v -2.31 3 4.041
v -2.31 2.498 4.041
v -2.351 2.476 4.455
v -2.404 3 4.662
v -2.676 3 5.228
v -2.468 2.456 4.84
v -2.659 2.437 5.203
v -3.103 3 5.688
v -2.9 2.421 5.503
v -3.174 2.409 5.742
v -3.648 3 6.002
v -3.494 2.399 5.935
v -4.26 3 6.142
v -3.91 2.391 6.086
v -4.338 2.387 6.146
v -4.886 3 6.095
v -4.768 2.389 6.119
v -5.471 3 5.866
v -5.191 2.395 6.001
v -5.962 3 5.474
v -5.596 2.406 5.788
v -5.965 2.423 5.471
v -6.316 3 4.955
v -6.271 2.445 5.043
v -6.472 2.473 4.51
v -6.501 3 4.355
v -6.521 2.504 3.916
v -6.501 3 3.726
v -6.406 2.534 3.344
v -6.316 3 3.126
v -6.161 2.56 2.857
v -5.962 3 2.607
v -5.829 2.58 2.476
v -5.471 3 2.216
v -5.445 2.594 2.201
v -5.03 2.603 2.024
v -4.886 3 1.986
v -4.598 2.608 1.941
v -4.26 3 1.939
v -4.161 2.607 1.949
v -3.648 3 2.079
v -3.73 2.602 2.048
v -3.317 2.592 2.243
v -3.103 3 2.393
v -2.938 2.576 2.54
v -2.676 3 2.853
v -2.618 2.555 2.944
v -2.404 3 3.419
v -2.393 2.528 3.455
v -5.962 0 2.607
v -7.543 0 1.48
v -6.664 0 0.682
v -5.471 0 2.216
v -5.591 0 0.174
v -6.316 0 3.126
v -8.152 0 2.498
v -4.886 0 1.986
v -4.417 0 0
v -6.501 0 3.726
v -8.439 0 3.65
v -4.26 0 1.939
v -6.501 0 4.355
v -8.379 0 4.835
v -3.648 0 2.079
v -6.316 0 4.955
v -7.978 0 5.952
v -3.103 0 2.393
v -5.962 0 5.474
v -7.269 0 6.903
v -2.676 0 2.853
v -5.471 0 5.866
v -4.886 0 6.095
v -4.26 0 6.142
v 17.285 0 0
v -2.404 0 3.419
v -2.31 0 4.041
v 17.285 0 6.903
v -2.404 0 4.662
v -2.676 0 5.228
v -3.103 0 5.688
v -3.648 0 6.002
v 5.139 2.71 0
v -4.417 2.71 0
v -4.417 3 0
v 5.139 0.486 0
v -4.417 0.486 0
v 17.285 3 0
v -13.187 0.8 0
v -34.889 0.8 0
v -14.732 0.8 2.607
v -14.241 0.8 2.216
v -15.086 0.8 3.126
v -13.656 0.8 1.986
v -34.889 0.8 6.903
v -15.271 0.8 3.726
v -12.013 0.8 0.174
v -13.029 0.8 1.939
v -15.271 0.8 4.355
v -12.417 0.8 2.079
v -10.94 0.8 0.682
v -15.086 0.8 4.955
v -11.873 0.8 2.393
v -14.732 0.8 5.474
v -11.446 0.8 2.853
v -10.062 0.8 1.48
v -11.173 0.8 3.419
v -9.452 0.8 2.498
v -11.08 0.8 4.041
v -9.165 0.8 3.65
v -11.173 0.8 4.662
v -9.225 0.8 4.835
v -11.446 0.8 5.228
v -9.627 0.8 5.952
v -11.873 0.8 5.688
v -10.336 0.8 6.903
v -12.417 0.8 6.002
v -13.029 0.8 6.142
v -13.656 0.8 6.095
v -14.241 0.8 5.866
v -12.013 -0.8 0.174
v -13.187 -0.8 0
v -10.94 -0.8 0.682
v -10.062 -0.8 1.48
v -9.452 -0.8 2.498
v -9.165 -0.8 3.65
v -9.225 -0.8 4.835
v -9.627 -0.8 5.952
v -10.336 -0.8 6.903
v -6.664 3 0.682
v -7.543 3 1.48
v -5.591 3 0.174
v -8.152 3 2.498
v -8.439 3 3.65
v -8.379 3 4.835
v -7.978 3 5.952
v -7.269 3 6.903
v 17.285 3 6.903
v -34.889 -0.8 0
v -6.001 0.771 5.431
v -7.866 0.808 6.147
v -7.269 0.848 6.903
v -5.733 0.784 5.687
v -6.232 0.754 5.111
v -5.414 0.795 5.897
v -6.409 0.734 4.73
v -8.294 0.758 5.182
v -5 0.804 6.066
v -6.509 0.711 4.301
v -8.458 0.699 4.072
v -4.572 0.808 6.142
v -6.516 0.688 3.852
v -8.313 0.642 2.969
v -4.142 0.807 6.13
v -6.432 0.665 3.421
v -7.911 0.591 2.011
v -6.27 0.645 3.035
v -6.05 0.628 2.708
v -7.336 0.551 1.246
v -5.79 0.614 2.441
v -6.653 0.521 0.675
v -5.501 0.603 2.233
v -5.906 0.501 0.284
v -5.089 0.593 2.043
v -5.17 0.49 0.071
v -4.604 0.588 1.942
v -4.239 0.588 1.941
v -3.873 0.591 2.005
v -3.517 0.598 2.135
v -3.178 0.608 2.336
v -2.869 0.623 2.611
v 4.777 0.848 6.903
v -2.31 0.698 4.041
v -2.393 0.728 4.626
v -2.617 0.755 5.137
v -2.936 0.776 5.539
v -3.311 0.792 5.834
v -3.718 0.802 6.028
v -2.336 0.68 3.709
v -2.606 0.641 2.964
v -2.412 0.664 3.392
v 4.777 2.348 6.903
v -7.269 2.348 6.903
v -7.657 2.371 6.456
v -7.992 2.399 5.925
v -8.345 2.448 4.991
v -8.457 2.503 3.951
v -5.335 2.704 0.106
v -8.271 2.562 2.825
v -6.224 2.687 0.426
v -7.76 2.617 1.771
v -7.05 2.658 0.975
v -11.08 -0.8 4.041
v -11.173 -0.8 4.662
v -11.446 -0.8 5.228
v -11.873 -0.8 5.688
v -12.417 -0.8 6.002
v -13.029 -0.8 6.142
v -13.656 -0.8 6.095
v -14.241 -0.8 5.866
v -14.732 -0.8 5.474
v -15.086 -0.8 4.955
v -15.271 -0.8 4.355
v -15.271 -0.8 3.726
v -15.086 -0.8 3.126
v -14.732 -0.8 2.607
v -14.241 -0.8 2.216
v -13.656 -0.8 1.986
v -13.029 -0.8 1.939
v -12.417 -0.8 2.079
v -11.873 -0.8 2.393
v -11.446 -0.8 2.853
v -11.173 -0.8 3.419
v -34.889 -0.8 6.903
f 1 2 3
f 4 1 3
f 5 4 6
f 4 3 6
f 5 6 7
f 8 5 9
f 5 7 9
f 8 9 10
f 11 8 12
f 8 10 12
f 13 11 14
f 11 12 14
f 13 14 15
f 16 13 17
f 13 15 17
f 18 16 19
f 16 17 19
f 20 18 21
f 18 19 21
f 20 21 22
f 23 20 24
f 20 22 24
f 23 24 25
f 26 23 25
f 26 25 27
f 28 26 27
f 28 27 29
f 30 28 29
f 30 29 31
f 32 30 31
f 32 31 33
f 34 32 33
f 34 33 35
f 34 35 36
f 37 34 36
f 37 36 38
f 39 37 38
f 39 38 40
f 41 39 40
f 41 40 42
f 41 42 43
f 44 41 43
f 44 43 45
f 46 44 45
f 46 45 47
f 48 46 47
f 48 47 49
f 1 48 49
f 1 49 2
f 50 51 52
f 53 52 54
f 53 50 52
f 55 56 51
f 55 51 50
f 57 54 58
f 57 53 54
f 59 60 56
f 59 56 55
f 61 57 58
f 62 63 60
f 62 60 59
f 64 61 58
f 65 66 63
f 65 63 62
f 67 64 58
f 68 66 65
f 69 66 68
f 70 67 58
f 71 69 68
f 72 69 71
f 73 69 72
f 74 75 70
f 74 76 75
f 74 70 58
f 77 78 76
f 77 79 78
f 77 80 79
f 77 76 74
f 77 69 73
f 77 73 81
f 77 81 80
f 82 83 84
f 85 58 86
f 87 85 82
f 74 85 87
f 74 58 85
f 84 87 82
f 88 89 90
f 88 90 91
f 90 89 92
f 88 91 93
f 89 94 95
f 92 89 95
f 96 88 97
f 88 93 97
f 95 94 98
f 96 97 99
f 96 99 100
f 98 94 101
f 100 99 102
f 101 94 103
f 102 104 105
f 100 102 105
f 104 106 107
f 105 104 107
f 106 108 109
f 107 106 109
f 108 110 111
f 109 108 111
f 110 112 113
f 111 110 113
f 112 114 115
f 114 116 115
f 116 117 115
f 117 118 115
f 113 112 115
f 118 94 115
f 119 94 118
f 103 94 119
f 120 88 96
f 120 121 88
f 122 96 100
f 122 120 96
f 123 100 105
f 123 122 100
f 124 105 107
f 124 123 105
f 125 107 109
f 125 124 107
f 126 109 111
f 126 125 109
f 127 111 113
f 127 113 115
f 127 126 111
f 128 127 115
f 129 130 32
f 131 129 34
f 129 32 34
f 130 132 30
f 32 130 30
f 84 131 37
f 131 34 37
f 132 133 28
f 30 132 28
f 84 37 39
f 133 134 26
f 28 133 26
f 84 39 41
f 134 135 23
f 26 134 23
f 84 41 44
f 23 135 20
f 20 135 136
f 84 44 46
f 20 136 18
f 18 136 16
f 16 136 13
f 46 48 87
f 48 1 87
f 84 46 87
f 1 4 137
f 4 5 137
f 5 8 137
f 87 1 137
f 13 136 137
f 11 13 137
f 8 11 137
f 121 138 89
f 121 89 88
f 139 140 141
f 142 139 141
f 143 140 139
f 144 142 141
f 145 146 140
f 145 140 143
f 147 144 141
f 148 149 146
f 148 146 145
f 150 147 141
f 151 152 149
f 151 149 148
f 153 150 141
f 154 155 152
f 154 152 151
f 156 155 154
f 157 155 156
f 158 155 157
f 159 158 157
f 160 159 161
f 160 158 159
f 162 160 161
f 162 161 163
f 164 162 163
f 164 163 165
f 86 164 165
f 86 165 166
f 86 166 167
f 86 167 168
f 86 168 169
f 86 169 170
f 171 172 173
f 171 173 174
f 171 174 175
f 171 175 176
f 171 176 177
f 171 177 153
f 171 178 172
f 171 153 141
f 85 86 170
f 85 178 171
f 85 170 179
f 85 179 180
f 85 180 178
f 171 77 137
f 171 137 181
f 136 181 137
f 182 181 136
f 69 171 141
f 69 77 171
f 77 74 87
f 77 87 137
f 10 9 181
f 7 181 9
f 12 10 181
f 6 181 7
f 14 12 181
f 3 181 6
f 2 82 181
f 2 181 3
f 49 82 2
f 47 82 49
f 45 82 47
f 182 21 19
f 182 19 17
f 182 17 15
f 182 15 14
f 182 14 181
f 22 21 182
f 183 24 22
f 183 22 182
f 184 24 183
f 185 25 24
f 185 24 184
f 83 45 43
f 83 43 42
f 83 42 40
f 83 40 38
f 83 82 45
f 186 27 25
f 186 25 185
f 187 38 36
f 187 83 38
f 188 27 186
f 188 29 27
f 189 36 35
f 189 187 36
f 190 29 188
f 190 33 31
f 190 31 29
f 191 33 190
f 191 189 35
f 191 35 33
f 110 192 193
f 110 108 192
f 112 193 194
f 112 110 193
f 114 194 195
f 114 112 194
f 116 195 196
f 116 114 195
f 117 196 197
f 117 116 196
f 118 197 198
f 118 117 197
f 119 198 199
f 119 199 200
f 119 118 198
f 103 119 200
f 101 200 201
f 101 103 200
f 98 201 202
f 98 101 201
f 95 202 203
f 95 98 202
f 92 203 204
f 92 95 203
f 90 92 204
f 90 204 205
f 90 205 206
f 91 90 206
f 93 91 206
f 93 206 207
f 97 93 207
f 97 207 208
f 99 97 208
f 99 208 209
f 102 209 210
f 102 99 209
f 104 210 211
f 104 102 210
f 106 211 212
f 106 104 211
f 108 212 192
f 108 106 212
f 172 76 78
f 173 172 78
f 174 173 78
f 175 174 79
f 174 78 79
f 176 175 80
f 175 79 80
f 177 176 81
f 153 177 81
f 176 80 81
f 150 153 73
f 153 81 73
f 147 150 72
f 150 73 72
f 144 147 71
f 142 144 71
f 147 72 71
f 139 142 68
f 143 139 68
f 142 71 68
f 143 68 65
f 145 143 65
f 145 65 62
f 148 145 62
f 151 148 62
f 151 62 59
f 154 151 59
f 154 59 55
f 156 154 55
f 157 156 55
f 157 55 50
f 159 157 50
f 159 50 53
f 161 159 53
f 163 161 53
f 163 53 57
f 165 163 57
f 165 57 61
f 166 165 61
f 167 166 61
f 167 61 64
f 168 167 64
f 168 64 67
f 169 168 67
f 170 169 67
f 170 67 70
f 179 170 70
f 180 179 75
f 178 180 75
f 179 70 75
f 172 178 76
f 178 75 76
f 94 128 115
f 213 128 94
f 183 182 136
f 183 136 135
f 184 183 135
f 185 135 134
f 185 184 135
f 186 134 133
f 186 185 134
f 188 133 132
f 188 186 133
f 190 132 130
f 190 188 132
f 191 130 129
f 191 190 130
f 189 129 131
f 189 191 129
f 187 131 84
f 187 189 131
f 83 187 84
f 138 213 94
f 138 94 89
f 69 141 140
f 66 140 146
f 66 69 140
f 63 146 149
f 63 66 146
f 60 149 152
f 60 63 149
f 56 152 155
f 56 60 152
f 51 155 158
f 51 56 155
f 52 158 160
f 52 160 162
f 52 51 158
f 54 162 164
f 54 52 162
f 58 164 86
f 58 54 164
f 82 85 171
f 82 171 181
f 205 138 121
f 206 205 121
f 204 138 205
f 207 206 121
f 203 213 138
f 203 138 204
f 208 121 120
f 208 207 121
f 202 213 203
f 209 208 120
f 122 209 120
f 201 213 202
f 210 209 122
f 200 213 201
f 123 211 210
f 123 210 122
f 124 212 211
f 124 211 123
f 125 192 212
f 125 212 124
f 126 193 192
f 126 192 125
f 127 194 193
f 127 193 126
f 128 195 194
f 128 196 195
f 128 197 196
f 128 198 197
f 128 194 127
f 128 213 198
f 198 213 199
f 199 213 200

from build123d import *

# Parameters (mm, degrees)
F0_R     = 2.107357614
F1_DEPTH = 3
F2_W     = 14.7599969779
F2_H     = 1.5
F3_DEPTH = 12.5
F3_TAPER = -3
F4_DEPTH = 0.8


with BuildPart() as f1:
    # F0 (on Front) → F1 (new body)
    with BuildSketch(Plane.XZ):
        with BuildLine():
            ThreePointArc((-7.268779725, 6.9034374319), (-8.1519679743, 2.4980690393), (-4.4174073264, 0))
            Line((-4.4174073264, 0), (17.2846987844, 0))
            Line((17.2846987844, 0), (17.2846987844, 6.9034374319))
            Line((17.2846987844, 6.9034374319), (-1.1204044567, 6.9034374319))
            Line((-1.1204044567, 6.9034374319), (-7.268779725, 6.9034374319))
        make_face()
        with Locations((-4.4174073264, 4.0405793115)):
            Circle(F0_R, mode=Mode.SUBTRACT)
    extrude(amount=-F1_DEPTH)

    # F2 (on face) → F3 (cut, symmetric)
    with BuildSketch(Plane.XY.offset(6.9034374319)):
        with Locations((-2.6028734865, 1.5977723524)):
            Rectangle(F2_W, F2_H)
    extrude(amount=F3_DEPTH, both=True, taper=F3_TAPER, mode=Mode.SUBTRACT)


with BuildPart() as f4:
    # F0 (on Front) → F4 (new body, symmetric)
    with BuildSketch(Plane.XZ):
        with BuildLine():
            Line((-10.3355769066, 6.9034374319), (-16.4839521749, 6.9034374319))
            Line((-16.4839521749, 6.9034374319), (-34.889055416, 6.9034374319))
            Line((-34.889055416, 6.9034374319), (-34.889055416, 0))
            Line((-34.889055416, 0), (-13.1869493052, 0))
            ThreePointArc((-13.1869493052, 0), (-9.4523886573, 2.4980690393), (-10.3355769066, 6.9034374319))
        make_face()
        with Locations((-13.1869493052, 4.0405793115)):
            Circle(F0_R, mode=Mode.SUBTRACT)
    extrude(amount=F4_DEPTH, both=True)


solid = Compound([f1.part, f4.part])
